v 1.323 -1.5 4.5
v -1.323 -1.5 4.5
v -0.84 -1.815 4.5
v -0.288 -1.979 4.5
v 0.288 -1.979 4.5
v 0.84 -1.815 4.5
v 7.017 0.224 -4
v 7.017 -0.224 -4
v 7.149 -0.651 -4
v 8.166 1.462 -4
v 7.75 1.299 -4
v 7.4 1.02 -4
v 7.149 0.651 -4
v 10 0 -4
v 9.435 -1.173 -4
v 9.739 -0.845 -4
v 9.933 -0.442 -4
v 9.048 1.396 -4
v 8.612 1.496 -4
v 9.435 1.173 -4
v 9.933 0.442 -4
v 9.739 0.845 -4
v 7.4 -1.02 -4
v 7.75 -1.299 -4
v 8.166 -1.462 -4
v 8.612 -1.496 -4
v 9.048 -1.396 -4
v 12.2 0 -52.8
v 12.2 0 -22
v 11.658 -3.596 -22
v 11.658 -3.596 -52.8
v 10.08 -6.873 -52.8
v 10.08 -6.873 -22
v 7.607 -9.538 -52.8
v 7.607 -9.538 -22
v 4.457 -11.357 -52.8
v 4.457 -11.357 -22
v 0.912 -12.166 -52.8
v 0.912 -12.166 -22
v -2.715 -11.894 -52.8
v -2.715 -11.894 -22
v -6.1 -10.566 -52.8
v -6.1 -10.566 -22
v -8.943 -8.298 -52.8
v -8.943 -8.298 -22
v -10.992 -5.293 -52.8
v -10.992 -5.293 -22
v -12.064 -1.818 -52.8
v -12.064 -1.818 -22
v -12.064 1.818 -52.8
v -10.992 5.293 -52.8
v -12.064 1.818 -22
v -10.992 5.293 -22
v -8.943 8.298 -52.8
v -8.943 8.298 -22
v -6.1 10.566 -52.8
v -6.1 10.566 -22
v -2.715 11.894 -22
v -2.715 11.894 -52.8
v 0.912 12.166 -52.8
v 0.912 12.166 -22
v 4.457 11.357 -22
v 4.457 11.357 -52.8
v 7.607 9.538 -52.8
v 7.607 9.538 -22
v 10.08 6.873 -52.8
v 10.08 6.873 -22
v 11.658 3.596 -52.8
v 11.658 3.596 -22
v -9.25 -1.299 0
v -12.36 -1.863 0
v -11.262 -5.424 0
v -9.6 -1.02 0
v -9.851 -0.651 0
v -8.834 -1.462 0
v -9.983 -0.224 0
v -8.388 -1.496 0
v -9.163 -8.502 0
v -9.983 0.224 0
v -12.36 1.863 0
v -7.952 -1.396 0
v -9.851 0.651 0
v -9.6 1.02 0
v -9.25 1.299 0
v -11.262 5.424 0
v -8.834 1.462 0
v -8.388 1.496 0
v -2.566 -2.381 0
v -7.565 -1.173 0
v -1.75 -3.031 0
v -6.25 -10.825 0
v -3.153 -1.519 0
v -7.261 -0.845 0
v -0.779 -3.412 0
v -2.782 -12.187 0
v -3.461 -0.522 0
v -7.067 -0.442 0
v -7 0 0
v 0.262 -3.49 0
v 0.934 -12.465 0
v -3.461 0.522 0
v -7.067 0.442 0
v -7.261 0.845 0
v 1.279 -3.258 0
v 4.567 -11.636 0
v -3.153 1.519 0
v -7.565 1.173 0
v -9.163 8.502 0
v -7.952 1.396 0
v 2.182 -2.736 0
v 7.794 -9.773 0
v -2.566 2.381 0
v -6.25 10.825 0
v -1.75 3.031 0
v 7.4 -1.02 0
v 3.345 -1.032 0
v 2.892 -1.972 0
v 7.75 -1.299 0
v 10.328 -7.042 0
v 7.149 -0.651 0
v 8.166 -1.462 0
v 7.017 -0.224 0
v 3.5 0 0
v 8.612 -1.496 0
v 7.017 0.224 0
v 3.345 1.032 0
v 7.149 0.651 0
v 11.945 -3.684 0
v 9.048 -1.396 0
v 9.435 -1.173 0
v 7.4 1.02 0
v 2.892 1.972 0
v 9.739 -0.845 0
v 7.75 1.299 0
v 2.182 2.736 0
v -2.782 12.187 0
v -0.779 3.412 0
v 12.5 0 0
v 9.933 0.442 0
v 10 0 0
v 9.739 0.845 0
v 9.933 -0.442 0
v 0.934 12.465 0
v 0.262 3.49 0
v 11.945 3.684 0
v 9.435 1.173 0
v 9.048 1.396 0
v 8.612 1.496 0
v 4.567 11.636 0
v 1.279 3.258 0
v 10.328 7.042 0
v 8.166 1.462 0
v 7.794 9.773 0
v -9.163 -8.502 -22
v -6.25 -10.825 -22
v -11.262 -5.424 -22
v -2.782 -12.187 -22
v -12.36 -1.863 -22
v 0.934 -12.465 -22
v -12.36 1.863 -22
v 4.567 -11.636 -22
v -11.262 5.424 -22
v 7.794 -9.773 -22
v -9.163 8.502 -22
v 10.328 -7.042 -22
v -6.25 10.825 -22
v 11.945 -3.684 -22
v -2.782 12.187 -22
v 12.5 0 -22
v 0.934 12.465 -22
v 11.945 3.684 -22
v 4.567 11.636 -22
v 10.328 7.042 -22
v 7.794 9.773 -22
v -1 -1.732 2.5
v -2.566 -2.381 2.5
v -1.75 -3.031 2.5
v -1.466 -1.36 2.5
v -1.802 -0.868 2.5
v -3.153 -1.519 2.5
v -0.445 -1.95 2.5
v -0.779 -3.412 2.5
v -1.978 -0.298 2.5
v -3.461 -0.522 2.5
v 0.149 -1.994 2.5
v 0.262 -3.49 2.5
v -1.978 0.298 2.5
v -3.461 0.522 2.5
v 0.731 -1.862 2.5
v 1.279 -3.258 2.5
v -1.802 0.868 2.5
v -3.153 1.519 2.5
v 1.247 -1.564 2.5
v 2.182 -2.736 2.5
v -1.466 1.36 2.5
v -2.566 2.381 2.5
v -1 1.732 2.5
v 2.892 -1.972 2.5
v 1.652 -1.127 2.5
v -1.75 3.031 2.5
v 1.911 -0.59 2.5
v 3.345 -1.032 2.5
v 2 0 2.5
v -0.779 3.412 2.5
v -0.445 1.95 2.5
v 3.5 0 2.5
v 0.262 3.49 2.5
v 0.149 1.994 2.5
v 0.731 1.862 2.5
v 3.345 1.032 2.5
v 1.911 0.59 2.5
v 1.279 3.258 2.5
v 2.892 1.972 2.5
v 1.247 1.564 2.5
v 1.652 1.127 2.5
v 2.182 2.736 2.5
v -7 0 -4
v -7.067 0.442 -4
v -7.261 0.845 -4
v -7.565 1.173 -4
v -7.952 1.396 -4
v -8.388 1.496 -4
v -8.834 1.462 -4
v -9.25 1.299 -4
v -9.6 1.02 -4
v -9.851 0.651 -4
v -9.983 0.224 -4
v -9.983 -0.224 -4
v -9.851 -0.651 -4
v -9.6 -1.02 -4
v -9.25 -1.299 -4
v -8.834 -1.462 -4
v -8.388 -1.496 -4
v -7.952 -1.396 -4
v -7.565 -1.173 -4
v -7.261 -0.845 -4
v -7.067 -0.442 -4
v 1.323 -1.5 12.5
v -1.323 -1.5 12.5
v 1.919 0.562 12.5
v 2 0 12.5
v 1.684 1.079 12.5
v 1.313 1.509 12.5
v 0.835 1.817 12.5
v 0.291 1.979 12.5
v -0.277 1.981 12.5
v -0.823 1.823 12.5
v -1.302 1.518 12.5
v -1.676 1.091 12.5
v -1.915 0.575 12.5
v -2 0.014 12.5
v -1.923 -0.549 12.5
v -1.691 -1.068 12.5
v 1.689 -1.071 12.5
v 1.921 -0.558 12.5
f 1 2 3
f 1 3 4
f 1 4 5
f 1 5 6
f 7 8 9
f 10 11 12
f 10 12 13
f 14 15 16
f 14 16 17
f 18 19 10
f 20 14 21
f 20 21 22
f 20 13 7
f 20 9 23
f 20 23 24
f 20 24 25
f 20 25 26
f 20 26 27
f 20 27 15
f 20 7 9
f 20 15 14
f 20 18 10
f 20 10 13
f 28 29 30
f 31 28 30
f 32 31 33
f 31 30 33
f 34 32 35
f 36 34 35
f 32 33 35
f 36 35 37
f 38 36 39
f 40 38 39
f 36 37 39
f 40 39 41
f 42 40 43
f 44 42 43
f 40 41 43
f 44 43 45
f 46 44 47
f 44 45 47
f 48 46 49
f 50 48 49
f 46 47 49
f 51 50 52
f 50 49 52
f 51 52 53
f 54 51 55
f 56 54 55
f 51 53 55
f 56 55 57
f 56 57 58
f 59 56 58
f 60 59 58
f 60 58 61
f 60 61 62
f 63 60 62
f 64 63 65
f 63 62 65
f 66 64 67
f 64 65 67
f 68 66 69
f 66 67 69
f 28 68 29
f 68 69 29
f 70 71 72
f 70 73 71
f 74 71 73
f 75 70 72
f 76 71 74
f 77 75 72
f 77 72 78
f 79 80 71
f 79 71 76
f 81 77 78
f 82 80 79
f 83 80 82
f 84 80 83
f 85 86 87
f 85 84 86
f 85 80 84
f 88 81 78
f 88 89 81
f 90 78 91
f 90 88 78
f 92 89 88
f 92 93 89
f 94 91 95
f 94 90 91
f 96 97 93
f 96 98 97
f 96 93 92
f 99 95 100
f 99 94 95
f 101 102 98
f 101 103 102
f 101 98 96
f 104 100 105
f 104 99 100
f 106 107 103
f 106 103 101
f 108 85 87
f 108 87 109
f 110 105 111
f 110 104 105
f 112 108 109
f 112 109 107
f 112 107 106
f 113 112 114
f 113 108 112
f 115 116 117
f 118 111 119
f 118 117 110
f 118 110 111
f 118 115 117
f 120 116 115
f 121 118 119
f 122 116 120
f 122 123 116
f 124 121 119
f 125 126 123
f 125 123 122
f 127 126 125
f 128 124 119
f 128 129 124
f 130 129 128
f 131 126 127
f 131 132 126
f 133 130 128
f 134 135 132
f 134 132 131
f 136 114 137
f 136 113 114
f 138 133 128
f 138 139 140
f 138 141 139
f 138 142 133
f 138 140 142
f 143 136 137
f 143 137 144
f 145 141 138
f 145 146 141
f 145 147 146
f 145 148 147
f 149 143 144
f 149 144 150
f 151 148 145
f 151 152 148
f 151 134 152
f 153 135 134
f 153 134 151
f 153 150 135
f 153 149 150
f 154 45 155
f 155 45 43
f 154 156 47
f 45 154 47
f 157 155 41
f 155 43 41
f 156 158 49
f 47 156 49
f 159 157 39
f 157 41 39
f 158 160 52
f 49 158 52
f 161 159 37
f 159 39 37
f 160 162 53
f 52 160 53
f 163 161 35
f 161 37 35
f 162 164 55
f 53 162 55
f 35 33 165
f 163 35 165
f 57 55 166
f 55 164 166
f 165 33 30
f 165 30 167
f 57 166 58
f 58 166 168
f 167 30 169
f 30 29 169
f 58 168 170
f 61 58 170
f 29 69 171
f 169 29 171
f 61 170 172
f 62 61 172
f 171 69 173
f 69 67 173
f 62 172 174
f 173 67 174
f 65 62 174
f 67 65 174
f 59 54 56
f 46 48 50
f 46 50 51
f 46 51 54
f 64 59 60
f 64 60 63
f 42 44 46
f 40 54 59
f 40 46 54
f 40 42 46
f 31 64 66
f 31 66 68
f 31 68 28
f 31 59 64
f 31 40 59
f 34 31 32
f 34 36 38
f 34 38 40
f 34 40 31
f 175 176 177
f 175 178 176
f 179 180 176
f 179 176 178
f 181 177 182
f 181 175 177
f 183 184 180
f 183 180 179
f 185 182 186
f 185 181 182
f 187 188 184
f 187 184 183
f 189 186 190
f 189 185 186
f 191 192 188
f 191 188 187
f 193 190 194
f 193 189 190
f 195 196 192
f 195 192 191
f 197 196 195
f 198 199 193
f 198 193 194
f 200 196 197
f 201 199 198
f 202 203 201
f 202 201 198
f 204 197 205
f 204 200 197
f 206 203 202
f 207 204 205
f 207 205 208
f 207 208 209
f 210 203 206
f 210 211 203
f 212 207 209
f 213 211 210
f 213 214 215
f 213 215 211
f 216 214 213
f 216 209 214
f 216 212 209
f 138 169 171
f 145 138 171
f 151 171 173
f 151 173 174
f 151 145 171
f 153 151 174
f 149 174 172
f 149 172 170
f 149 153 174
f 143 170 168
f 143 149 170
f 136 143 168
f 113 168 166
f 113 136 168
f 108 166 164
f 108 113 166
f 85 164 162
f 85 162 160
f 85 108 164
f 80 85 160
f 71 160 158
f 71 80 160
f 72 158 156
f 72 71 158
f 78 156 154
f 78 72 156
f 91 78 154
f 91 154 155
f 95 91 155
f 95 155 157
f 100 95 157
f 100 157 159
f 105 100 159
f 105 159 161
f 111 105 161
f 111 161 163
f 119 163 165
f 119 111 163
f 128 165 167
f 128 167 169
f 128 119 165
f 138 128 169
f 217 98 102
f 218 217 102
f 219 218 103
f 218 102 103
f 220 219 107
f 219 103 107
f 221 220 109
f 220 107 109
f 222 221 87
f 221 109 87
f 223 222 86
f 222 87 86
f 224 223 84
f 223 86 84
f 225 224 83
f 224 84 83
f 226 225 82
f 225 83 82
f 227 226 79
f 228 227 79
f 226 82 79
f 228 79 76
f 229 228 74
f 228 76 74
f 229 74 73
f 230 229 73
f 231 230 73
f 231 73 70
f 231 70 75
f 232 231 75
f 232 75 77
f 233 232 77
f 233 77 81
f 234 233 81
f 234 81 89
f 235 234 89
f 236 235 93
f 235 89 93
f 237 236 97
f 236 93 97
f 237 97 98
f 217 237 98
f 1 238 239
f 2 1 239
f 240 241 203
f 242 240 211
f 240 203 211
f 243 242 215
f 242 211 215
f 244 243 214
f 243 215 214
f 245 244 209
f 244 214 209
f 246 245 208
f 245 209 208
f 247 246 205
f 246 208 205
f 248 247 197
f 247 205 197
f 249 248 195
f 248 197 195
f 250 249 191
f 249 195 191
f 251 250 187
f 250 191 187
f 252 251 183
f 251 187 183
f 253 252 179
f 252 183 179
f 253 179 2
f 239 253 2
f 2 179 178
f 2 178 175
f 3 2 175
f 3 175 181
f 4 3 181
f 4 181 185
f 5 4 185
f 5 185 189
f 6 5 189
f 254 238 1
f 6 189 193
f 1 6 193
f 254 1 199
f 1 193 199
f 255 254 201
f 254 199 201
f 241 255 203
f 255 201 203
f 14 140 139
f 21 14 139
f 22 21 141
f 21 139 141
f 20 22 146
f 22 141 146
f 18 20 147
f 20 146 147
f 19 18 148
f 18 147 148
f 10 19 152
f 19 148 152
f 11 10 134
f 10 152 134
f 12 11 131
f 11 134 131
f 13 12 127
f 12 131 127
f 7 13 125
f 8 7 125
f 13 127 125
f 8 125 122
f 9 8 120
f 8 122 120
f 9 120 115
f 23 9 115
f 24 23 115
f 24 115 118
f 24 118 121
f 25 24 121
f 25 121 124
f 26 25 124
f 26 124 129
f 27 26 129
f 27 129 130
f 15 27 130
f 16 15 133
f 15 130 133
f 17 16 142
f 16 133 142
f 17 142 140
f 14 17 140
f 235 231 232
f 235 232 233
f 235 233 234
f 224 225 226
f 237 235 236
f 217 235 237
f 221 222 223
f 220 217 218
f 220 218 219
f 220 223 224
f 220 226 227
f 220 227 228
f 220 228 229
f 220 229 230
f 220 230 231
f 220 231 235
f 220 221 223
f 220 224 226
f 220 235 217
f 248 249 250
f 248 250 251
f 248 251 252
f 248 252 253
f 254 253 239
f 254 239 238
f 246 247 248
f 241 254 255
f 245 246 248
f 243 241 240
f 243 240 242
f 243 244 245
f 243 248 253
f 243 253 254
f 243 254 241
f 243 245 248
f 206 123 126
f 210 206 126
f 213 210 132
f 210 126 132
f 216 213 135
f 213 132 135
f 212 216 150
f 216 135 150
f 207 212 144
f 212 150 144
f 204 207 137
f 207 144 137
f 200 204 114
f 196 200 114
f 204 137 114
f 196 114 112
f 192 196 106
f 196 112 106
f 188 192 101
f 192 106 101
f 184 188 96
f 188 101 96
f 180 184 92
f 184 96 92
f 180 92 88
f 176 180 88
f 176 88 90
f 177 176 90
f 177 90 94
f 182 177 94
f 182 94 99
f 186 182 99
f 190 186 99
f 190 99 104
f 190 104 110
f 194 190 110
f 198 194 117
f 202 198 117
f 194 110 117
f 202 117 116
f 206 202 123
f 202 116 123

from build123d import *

# Parameters (mm, degrees)
F0_R      = 12.5
F1_DEPTH  = 22
F2_R      = 12.2
F3_DEPTH  = 30.8
F4_R      = 3.5
F5_DEPTH  = 2.5
F6_R      = 2
F7_DEPTH  = 12.5
F9_DEPTH  = 8
F10_R     = 1.5
F11_DEPTH = 4


with BuildPart() as f1:
    # F0 (on Top) → F1 (new body)
    with BuildSketch(Plane.XY):
        Circle(F0_R)
    extrude(amount=-F1_DEPTH)

    # F2 (on face) → F3 (join)
    with BuildSketch(Plane(origin=(0, 0, -22), x_dir=(1, 0, 0), z_dir=(0, 0, -1))):
        Circle(F2_R)
    extrude(amount=F3_DEPTH)

    # F4 (on face) → F5 (join)
    with BuildSketch(Plane.XY):
        Circle(F4_R)
    extrude(amount=F5_DEPTH)

    # F6 (on face) → F7 (join)
    with BuildSketch(Plane.XY):
        Circle(F6_R)
    extrude(amount=F7_DEPTH)

    # F8 (on face) → F9 (cut)
    with BuildSketch(Plane.XY.offset(12.5)):
        with BuildLine():
            Line((1.322876, -1.5), (-1.322876, -1.5))
            ThreePointArc((-1.322876, -1.5), (0, -2), (1.322876, -1.5))
        make_face()
    extrude(amount=-F9_DEPTH, mode=Mode.SUBTRACT)

    # F10 (on face) → F11 (cut)
    with BuildSketch(Plane.XY):
        with Locations((-8.5, 0)):
            Circle(F10_R)
        with Locations((8.5, 0)):
            Circle(F10_R)
    extrude(amount=-F11_DEPTH, mode=Mode.SUBTRACT)


solid = f1.part
